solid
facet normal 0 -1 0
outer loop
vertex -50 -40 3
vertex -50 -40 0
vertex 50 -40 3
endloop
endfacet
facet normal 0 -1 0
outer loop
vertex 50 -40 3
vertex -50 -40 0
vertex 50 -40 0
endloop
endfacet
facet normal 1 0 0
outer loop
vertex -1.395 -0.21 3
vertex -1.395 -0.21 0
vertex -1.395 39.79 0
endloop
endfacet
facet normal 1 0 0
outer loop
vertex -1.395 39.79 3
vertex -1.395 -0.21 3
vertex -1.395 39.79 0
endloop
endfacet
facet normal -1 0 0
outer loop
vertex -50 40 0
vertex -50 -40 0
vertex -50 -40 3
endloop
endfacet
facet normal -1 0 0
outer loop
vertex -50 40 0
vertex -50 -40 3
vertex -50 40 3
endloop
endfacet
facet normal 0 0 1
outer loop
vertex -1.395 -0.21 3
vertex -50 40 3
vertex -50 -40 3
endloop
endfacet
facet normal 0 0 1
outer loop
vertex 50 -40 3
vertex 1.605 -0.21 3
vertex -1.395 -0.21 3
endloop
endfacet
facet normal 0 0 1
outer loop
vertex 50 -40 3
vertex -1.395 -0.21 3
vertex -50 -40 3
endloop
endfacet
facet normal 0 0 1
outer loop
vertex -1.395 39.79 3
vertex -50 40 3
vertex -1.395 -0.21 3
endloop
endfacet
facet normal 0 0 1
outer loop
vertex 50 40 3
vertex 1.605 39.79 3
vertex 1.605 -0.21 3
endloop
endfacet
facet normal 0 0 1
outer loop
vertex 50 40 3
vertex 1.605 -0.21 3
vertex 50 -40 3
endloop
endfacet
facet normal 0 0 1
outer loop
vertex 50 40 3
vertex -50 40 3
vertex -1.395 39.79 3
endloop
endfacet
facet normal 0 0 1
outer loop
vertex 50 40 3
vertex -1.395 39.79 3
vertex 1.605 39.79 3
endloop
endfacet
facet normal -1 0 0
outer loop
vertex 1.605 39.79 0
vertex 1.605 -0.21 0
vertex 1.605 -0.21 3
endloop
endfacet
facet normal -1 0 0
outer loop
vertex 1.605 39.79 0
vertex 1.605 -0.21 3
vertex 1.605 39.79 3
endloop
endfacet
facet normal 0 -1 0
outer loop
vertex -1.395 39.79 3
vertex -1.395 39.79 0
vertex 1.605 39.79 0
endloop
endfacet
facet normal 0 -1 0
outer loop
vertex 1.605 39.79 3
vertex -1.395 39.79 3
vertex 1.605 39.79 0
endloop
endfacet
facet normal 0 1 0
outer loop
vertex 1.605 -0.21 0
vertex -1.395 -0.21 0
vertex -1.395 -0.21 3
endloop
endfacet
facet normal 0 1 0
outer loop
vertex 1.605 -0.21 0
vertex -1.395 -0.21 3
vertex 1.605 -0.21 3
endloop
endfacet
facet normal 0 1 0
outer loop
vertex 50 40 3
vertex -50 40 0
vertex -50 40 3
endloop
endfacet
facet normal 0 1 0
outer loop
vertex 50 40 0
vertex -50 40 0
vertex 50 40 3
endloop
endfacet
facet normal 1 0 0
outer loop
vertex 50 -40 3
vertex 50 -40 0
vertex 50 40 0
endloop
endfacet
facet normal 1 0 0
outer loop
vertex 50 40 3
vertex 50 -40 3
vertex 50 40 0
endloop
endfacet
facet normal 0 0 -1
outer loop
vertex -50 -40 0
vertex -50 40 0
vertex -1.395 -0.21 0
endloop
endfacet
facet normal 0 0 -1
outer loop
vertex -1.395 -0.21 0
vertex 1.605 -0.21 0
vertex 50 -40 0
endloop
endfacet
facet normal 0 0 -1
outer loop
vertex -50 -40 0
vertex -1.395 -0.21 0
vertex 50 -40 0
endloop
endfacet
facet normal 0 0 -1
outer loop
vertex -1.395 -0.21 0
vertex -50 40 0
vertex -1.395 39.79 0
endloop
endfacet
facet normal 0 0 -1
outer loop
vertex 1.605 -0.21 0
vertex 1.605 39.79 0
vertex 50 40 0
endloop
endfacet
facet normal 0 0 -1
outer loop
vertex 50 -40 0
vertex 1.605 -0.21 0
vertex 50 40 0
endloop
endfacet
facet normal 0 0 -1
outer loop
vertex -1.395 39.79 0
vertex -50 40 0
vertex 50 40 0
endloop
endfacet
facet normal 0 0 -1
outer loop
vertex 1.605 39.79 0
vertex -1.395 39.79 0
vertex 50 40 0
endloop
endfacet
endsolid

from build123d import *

# Parameters (mm, degrees)
SKETCH1_W               = 100
SKETCH1_H               = 80
BOSS_EXTRUDE1_DEPTH     = 3
CUT_EXTRUDE1_DEPTH      = 22
CUT_EXTRUDE1_DEPTH_BACK = 13
SKETCH2_W               = 3
SKETCH2_H               = 40


with BuildPart() as part:
    # Sketch1 → Boss-Extrude1 (new body)
    with BuildSketch(Plane.XY):
        Rectangle(SKETCH1_W, SKETCH1_H)
    extrude(amount=BOSS_EXTRUDE1_DEPTH)

    # Sketch2 → Cut-Extrude1 (cut, two sides: drawn at the far end of the back side and taken through both)
    with BuildSketch(Plane.XY.offset(3).offset(-CUT_EXTRUDE1_DEPTH_BACK)):
        with Locations((0.105052813, 19.789894374)):
            Rectangle(SKETCH2_W, SKETCH2_H)
    extrude(amount=CUT_EXTRUDE1_DEPTH + CUT_EXTRUDE1_DEPTH_BACK, mode=Mode.SUBTRACT)


solid = part.part
